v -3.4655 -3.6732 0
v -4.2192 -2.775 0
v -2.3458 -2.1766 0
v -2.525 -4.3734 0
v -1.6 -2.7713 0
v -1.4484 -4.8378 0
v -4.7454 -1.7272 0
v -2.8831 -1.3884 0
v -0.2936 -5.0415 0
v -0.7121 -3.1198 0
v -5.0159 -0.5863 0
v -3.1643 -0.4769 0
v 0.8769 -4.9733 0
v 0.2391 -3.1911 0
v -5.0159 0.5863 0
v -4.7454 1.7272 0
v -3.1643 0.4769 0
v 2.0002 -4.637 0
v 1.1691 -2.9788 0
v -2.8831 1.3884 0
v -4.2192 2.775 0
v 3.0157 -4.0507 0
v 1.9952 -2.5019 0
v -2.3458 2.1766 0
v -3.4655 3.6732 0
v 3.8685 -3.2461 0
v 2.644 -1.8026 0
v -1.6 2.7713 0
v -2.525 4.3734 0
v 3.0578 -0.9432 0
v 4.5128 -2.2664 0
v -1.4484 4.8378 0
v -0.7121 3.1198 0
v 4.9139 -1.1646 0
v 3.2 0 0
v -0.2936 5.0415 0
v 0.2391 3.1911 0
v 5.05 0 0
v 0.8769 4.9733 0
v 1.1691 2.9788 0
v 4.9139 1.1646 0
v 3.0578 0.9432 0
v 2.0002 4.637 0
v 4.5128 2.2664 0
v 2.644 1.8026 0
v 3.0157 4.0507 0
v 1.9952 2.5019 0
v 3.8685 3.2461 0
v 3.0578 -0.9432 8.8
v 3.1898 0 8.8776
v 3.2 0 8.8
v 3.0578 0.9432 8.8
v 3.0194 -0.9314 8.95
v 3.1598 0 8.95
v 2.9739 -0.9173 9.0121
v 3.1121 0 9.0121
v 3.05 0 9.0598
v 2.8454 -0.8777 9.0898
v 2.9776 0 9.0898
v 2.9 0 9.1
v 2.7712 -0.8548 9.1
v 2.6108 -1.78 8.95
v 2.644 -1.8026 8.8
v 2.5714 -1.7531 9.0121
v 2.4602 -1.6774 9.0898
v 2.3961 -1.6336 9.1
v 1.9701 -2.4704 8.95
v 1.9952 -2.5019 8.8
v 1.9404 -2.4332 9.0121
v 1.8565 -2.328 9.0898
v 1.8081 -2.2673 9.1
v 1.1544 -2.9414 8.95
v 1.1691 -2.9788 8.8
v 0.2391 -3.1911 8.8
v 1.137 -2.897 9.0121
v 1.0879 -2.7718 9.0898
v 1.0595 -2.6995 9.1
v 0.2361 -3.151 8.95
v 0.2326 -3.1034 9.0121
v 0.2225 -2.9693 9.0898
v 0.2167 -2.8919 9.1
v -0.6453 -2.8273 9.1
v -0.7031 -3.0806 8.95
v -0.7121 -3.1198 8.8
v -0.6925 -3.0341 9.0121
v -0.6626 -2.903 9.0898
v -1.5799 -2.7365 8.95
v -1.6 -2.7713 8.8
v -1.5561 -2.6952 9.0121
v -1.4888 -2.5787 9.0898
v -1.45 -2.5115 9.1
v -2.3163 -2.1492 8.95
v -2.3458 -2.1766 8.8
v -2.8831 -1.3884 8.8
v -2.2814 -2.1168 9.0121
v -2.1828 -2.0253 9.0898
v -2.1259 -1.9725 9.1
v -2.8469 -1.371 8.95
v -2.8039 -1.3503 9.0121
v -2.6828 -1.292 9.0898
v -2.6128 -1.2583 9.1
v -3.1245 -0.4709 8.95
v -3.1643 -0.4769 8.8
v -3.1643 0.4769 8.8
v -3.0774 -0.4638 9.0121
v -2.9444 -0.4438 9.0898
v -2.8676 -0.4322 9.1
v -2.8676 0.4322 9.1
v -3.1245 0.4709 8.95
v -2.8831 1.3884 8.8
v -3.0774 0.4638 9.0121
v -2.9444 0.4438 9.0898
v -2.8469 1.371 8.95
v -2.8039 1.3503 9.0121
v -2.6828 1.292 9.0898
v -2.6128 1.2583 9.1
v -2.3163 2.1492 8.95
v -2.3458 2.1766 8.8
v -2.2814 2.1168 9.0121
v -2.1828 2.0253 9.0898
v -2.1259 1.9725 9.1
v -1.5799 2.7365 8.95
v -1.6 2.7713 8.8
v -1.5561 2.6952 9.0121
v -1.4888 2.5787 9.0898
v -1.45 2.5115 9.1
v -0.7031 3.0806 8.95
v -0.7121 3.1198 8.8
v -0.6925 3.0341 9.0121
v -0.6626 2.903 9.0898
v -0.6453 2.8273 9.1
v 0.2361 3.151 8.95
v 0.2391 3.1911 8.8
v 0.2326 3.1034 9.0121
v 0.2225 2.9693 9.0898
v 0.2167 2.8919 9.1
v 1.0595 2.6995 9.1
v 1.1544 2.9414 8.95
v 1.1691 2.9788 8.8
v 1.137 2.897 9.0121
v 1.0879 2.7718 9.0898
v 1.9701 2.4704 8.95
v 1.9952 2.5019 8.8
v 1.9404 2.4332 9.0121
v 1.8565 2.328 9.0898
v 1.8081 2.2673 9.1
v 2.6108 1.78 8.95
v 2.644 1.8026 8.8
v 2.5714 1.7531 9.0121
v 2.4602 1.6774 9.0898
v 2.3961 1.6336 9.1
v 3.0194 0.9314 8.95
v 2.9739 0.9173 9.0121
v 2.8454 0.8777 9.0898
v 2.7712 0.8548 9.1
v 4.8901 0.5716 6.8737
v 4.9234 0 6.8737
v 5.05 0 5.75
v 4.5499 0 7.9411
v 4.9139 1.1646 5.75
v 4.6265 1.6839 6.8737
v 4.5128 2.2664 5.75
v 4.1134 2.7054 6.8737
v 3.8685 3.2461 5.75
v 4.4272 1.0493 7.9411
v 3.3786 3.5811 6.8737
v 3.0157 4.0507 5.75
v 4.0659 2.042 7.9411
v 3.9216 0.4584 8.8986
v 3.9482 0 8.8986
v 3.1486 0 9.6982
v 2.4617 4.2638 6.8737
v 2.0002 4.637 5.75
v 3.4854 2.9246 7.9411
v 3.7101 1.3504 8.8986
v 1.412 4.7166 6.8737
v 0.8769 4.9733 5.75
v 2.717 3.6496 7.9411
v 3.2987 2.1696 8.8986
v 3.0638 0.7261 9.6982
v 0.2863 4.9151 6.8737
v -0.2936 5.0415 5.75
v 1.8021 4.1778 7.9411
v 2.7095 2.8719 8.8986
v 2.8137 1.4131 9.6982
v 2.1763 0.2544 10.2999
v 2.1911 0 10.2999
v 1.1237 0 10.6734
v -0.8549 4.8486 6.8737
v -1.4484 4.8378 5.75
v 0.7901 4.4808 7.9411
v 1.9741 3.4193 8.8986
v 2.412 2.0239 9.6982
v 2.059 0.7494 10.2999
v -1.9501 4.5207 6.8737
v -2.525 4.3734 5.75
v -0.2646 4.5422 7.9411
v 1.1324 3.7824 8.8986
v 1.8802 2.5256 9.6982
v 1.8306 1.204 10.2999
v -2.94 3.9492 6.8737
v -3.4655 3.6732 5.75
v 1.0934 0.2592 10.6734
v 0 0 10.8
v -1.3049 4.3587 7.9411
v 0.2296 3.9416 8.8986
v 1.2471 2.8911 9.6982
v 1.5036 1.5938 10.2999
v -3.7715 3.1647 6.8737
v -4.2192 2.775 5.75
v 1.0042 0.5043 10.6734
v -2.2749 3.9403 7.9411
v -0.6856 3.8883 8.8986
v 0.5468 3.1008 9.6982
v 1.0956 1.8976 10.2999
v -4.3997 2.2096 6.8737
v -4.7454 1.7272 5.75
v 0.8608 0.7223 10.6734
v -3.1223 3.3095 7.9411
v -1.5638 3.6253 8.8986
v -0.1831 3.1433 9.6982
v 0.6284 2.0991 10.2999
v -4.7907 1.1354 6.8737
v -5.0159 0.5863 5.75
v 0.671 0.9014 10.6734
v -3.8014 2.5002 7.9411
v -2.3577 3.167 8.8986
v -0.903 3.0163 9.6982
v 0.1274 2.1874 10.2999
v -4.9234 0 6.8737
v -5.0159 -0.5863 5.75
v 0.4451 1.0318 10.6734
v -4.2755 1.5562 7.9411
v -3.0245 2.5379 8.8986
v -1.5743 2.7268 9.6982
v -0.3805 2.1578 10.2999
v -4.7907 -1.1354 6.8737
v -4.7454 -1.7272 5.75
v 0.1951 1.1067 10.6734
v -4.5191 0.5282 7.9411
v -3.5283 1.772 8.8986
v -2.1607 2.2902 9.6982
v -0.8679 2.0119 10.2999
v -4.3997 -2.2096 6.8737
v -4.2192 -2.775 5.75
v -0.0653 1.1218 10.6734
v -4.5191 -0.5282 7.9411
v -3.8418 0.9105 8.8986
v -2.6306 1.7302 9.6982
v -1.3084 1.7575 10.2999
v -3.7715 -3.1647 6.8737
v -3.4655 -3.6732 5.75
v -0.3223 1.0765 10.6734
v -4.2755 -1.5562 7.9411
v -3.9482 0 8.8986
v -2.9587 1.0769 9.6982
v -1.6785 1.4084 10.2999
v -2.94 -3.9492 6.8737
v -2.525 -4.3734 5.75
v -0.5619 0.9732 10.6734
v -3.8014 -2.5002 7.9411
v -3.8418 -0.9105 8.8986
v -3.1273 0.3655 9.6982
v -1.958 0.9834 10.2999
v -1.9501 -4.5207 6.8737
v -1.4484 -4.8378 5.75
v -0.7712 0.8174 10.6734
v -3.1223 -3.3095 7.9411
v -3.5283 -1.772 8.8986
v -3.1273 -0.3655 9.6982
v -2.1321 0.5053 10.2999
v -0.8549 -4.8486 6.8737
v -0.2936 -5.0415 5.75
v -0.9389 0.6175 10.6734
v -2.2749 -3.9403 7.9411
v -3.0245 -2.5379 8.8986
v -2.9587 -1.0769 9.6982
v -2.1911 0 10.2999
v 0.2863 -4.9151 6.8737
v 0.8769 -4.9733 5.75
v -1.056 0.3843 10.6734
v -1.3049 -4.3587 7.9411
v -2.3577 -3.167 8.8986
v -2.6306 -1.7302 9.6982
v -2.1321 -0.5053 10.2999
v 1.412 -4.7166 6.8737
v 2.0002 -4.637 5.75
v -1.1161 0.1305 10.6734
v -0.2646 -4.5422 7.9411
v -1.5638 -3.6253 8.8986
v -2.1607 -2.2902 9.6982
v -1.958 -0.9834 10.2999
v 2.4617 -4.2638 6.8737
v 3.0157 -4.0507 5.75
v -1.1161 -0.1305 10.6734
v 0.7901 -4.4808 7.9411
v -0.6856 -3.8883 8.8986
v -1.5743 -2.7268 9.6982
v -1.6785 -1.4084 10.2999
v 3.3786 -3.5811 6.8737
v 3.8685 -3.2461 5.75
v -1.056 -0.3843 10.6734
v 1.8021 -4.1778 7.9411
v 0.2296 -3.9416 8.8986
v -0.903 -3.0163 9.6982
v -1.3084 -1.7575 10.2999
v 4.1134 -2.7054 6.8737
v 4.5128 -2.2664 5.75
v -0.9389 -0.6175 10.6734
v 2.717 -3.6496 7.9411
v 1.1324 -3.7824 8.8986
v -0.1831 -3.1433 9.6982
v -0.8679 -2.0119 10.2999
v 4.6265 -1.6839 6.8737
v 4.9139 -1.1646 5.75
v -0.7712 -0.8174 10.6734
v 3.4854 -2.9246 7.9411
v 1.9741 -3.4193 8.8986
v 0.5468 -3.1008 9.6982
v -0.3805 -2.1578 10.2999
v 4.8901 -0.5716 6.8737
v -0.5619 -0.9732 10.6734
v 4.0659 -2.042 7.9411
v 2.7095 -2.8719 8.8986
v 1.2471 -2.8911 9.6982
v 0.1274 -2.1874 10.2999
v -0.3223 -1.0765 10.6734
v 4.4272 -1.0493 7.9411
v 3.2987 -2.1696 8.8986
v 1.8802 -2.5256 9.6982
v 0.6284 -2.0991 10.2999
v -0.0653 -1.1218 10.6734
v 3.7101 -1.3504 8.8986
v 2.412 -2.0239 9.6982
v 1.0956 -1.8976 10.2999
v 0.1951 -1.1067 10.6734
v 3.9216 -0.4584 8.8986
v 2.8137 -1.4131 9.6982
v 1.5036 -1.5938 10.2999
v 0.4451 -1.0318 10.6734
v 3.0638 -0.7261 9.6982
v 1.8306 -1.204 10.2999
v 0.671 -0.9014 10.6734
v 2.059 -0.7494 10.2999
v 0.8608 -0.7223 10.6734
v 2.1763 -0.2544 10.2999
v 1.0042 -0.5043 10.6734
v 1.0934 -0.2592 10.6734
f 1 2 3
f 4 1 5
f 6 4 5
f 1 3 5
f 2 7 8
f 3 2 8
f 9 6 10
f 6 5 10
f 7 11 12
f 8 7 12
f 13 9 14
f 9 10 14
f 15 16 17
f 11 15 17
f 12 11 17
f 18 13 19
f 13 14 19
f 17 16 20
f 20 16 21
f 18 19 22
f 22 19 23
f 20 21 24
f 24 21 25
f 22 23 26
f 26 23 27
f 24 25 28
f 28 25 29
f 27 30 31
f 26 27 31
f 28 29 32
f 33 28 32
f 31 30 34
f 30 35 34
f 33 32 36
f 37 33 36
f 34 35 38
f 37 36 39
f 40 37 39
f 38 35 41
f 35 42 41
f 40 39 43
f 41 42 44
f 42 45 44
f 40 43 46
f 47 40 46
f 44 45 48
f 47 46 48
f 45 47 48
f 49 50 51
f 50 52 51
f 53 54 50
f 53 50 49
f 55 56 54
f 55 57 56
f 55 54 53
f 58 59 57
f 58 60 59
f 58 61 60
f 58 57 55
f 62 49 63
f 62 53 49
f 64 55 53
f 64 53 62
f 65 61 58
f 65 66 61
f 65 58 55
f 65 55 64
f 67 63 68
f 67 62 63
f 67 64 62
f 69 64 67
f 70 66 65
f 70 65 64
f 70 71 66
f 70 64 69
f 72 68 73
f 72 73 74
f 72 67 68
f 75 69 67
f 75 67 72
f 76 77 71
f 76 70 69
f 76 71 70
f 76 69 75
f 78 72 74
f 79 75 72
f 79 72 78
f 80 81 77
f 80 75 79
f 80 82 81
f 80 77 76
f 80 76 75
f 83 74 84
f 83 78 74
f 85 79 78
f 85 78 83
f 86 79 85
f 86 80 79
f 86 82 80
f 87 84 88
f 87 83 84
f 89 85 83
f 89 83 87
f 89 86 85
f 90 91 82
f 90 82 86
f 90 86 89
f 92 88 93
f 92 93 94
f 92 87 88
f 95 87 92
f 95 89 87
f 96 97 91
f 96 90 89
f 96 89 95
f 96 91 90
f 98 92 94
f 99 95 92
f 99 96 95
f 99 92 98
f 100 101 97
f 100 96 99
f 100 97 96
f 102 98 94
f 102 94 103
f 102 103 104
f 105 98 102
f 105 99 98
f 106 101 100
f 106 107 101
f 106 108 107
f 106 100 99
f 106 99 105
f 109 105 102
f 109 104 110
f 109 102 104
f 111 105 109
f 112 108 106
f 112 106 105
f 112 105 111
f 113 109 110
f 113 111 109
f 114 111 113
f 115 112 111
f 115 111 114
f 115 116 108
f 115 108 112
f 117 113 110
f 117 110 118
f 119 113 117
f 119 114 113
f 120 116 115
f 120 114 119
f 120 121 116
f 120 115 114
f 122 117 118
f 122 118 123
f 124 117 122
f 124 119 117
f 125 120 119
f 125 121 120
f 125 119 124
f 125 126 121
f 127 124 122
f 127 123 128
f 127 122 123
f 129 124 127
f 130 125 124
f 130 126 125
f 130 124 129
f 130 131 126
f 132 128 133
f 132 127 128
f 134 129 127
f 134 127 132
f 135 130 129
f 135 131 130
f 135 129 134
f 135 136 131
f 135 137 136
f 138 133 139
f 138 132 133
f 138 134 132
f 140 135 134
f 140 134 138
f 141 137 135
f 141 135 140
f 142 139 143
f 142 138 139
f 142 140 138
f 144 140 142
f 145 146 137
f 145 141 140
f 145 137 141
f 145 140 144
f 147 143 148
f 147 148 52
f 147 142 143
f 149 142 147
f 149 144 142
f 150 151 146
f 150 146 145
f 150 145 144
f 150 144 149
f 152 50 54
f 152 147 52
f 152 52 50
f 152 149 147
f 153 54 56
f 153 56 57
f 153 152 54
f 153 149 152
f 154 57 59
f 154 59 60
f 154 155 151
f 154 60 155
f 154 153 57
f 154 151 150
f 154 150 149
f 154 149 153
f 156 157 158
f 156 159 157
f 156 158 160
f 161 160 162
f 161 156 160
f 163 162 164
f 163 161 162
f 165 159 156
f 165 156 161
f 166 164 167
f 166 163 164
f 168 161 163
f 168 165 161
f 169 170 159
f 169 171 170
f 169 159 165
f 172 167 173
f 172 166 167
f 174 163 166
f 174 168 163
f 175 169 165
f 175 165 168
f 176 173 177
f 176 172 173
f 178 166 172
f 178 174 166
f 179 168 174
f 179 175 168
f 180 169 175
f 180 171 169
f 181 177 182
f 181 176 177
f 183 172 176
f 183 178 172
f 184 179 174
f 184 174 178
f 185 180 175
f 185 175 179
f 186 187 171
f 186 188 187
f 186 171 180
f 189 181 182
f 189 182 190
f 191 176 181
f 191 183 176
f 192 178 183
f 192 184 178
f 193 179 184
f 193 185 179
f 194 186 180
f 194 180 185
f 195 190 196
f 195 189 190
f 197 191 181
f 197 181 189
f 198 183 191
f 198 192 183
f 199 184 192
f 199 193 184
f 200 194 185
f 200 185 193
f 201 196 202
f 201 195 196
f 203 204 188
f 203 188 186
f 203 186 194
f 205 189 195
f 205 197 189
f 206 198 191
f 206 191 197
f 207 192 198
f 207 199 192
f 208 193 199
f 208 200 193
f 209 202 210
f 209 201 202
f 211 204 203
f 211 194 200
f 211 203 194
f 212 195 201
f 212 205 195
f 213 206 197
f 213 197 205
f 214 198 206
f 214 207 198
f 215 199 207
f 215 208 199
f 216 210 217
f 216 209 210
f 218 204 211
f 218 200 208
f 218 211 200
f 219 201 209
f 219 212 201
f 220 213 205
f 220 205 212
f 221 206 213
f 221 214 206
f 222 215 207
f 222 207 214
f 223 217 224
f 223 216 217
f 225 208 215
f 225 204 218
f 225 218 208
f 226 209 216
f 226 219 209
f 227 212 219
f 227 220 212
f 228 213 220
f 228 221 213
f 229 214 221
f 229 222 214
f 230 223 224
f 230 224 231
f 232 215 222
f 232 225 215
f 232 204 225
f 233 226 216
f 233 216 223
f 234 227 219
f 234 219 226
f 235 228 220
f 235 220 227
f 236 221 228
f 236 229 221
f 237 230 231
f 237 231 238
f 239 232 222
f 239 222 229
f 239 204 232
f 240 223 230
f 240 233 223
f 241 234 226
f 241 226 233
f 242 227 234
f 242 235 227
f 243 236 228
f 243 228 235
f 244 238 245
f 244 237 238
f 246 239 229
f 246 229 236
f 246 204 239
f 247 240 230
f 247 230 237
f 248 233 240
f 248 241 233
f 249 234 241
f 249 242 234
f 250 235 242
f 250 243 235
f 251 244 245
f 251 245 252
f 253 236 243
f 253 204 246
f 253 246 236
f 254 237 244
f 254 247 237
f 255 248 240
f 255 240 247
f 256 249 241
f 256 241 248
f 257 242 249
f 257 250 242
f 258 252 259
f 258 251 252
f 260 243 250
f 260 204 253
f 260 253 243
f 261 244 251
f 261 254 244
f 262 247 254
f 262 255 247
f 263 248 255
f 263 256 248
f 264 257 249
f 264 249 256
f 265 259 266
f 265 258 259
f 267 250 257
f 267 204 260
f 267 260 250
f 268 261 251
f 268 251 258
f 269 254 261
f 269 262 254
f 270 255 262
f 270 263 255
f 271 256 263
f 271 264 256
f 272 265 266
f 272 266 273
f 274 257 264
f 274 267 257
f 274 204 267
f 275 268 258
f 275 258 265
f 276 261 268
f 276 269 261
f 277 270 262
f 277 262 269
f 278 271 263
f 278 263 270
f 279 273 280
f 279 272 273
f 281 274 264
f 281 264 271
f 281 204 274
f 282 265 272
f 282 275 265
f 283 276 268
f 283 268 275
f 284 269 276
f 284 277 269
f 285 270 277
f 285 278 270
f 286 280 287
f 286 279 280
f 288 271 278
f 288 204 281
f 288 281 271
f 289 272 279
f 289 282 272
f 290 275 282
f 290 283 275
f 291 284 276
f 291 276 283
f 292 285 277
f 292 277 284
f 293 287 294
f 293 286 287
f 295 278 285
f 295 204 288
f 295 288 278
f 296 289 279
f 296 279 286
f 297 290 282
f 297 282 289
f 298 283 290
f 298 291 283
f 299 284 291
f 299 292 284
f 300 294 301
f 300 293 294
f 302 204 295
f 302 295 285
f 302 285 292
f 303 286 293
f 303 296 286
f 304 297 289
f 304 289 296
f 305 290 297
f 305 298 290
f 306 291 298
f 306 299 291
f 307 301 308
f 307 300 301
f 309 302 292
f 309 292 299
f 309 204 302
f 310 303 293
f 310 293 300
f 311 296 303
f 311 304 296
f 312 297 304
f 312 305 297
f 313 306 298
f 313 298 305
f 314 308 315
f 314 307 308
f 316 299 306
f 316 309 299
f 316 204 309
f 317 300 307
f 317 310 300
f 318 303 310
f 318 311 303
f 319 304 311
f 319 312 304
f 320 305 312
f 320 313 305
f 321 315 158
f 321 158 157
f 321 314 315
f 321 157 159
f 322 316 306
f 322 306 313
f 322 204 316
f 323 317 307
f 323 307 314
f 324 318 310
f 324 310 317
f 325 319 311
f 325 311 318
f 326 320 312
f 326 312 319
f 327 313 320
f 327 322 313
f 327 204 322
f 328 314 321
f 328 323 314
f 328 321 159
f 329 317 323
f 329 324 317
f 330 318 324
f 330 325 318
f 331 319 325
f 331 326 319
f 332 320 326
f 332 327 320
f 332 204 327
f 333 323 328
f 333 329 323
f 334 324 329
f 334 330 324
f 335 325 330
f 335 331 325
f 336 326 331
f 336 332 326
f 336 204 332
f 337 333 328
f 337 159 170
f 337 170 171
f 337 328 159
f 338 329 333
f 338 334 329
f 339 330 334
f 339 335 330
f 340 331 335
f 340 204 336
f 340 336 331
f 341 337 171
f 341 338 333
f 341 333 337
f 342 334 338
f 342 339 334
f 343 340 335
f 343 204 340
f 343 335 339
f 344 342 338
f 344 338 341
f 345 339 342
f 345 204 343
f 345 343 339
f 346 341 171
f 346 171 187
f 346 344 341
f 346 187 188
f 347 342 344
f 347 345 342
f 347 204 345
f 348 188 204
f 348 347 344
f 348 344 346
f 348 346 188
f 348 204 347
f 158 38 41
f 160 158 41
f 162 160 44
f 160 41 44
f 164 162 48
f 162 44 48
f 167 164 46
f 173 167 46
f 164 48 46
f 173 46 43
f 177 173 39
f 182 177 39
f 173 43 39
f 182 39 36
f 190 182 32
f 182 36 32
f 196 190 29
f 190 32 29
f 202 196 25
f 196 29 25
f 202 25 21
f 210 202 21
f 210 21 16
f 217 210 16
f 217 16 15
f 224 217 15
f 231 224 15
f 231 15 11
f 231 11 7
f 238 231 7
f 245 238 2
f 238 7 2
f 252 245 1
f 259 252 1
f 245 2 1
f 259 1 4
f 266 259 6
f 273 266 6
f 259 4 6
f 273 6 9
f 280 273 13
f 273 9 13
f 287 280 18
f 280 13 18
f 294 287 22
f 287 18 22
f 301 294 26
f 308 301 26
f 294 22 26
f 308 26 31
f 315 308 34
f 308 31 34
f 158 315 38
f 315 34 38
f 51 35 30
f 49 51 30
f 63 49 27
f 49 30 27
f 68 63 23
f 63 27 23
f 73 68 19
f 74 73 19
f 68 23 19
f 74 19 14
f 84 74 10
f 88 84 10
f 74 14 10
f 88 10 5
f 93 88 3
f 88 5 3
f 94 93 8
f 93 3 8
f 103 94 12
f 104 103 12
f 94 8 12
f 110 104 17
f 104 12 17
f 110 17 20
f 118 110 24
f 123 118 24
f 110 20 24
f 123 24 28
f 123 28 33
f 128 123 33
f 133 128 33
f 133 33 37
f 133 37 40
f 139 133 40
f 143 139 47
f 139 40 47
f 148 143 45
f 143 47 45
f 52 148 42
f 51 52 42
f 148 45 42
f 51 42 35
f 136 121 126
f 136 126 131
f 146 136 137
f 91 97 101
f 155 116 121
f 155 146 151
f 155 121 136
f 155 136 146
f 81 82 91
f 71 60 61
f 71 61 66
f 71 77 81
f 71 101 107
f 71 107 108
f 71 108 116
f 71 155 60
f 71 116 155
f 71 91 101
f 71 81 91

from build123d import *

# Parameters (mm, degrees)
F0_R     = 5.05
F1_DEPTH = 10.8
F2_R     = 5.05
F3_R     = 3.2
F4_DEPTH = 9.1
F5_R     = 0.3


with BuildPart() as f1:
    # F0 (on Top) → F1 (new body)
    with BuildSketch(Plane.XY):
        Circle(F0_R)
    extrude(amount=F1_DEPTH)

    # F2
    f2_edges = [f1.edges().sort_by_distance(p)[0] for p in [
        (-5.05, 0, 10.8),
    ]]
    fillet(f2_edges, radius=F2_R)

    # F3 (on face) → F4 (cut)
    with BuildSketch(Plane(origin=(0, 0, 0), x_dir=(1, 0, 0), z_dir=(0, 0, -1))):
        Circle(F3_R)
    extrude(amount=-F4_DEPTH, mode=Mode.SUBTRACT)

    # F5
    f5_edges = [f1.edges().sort_by_distance(p)[0] for p in [
        (-3.2, 0, 9.1),
    ]]
    fillet(f5_edges, radius=F5_R)


solid = f1.part
